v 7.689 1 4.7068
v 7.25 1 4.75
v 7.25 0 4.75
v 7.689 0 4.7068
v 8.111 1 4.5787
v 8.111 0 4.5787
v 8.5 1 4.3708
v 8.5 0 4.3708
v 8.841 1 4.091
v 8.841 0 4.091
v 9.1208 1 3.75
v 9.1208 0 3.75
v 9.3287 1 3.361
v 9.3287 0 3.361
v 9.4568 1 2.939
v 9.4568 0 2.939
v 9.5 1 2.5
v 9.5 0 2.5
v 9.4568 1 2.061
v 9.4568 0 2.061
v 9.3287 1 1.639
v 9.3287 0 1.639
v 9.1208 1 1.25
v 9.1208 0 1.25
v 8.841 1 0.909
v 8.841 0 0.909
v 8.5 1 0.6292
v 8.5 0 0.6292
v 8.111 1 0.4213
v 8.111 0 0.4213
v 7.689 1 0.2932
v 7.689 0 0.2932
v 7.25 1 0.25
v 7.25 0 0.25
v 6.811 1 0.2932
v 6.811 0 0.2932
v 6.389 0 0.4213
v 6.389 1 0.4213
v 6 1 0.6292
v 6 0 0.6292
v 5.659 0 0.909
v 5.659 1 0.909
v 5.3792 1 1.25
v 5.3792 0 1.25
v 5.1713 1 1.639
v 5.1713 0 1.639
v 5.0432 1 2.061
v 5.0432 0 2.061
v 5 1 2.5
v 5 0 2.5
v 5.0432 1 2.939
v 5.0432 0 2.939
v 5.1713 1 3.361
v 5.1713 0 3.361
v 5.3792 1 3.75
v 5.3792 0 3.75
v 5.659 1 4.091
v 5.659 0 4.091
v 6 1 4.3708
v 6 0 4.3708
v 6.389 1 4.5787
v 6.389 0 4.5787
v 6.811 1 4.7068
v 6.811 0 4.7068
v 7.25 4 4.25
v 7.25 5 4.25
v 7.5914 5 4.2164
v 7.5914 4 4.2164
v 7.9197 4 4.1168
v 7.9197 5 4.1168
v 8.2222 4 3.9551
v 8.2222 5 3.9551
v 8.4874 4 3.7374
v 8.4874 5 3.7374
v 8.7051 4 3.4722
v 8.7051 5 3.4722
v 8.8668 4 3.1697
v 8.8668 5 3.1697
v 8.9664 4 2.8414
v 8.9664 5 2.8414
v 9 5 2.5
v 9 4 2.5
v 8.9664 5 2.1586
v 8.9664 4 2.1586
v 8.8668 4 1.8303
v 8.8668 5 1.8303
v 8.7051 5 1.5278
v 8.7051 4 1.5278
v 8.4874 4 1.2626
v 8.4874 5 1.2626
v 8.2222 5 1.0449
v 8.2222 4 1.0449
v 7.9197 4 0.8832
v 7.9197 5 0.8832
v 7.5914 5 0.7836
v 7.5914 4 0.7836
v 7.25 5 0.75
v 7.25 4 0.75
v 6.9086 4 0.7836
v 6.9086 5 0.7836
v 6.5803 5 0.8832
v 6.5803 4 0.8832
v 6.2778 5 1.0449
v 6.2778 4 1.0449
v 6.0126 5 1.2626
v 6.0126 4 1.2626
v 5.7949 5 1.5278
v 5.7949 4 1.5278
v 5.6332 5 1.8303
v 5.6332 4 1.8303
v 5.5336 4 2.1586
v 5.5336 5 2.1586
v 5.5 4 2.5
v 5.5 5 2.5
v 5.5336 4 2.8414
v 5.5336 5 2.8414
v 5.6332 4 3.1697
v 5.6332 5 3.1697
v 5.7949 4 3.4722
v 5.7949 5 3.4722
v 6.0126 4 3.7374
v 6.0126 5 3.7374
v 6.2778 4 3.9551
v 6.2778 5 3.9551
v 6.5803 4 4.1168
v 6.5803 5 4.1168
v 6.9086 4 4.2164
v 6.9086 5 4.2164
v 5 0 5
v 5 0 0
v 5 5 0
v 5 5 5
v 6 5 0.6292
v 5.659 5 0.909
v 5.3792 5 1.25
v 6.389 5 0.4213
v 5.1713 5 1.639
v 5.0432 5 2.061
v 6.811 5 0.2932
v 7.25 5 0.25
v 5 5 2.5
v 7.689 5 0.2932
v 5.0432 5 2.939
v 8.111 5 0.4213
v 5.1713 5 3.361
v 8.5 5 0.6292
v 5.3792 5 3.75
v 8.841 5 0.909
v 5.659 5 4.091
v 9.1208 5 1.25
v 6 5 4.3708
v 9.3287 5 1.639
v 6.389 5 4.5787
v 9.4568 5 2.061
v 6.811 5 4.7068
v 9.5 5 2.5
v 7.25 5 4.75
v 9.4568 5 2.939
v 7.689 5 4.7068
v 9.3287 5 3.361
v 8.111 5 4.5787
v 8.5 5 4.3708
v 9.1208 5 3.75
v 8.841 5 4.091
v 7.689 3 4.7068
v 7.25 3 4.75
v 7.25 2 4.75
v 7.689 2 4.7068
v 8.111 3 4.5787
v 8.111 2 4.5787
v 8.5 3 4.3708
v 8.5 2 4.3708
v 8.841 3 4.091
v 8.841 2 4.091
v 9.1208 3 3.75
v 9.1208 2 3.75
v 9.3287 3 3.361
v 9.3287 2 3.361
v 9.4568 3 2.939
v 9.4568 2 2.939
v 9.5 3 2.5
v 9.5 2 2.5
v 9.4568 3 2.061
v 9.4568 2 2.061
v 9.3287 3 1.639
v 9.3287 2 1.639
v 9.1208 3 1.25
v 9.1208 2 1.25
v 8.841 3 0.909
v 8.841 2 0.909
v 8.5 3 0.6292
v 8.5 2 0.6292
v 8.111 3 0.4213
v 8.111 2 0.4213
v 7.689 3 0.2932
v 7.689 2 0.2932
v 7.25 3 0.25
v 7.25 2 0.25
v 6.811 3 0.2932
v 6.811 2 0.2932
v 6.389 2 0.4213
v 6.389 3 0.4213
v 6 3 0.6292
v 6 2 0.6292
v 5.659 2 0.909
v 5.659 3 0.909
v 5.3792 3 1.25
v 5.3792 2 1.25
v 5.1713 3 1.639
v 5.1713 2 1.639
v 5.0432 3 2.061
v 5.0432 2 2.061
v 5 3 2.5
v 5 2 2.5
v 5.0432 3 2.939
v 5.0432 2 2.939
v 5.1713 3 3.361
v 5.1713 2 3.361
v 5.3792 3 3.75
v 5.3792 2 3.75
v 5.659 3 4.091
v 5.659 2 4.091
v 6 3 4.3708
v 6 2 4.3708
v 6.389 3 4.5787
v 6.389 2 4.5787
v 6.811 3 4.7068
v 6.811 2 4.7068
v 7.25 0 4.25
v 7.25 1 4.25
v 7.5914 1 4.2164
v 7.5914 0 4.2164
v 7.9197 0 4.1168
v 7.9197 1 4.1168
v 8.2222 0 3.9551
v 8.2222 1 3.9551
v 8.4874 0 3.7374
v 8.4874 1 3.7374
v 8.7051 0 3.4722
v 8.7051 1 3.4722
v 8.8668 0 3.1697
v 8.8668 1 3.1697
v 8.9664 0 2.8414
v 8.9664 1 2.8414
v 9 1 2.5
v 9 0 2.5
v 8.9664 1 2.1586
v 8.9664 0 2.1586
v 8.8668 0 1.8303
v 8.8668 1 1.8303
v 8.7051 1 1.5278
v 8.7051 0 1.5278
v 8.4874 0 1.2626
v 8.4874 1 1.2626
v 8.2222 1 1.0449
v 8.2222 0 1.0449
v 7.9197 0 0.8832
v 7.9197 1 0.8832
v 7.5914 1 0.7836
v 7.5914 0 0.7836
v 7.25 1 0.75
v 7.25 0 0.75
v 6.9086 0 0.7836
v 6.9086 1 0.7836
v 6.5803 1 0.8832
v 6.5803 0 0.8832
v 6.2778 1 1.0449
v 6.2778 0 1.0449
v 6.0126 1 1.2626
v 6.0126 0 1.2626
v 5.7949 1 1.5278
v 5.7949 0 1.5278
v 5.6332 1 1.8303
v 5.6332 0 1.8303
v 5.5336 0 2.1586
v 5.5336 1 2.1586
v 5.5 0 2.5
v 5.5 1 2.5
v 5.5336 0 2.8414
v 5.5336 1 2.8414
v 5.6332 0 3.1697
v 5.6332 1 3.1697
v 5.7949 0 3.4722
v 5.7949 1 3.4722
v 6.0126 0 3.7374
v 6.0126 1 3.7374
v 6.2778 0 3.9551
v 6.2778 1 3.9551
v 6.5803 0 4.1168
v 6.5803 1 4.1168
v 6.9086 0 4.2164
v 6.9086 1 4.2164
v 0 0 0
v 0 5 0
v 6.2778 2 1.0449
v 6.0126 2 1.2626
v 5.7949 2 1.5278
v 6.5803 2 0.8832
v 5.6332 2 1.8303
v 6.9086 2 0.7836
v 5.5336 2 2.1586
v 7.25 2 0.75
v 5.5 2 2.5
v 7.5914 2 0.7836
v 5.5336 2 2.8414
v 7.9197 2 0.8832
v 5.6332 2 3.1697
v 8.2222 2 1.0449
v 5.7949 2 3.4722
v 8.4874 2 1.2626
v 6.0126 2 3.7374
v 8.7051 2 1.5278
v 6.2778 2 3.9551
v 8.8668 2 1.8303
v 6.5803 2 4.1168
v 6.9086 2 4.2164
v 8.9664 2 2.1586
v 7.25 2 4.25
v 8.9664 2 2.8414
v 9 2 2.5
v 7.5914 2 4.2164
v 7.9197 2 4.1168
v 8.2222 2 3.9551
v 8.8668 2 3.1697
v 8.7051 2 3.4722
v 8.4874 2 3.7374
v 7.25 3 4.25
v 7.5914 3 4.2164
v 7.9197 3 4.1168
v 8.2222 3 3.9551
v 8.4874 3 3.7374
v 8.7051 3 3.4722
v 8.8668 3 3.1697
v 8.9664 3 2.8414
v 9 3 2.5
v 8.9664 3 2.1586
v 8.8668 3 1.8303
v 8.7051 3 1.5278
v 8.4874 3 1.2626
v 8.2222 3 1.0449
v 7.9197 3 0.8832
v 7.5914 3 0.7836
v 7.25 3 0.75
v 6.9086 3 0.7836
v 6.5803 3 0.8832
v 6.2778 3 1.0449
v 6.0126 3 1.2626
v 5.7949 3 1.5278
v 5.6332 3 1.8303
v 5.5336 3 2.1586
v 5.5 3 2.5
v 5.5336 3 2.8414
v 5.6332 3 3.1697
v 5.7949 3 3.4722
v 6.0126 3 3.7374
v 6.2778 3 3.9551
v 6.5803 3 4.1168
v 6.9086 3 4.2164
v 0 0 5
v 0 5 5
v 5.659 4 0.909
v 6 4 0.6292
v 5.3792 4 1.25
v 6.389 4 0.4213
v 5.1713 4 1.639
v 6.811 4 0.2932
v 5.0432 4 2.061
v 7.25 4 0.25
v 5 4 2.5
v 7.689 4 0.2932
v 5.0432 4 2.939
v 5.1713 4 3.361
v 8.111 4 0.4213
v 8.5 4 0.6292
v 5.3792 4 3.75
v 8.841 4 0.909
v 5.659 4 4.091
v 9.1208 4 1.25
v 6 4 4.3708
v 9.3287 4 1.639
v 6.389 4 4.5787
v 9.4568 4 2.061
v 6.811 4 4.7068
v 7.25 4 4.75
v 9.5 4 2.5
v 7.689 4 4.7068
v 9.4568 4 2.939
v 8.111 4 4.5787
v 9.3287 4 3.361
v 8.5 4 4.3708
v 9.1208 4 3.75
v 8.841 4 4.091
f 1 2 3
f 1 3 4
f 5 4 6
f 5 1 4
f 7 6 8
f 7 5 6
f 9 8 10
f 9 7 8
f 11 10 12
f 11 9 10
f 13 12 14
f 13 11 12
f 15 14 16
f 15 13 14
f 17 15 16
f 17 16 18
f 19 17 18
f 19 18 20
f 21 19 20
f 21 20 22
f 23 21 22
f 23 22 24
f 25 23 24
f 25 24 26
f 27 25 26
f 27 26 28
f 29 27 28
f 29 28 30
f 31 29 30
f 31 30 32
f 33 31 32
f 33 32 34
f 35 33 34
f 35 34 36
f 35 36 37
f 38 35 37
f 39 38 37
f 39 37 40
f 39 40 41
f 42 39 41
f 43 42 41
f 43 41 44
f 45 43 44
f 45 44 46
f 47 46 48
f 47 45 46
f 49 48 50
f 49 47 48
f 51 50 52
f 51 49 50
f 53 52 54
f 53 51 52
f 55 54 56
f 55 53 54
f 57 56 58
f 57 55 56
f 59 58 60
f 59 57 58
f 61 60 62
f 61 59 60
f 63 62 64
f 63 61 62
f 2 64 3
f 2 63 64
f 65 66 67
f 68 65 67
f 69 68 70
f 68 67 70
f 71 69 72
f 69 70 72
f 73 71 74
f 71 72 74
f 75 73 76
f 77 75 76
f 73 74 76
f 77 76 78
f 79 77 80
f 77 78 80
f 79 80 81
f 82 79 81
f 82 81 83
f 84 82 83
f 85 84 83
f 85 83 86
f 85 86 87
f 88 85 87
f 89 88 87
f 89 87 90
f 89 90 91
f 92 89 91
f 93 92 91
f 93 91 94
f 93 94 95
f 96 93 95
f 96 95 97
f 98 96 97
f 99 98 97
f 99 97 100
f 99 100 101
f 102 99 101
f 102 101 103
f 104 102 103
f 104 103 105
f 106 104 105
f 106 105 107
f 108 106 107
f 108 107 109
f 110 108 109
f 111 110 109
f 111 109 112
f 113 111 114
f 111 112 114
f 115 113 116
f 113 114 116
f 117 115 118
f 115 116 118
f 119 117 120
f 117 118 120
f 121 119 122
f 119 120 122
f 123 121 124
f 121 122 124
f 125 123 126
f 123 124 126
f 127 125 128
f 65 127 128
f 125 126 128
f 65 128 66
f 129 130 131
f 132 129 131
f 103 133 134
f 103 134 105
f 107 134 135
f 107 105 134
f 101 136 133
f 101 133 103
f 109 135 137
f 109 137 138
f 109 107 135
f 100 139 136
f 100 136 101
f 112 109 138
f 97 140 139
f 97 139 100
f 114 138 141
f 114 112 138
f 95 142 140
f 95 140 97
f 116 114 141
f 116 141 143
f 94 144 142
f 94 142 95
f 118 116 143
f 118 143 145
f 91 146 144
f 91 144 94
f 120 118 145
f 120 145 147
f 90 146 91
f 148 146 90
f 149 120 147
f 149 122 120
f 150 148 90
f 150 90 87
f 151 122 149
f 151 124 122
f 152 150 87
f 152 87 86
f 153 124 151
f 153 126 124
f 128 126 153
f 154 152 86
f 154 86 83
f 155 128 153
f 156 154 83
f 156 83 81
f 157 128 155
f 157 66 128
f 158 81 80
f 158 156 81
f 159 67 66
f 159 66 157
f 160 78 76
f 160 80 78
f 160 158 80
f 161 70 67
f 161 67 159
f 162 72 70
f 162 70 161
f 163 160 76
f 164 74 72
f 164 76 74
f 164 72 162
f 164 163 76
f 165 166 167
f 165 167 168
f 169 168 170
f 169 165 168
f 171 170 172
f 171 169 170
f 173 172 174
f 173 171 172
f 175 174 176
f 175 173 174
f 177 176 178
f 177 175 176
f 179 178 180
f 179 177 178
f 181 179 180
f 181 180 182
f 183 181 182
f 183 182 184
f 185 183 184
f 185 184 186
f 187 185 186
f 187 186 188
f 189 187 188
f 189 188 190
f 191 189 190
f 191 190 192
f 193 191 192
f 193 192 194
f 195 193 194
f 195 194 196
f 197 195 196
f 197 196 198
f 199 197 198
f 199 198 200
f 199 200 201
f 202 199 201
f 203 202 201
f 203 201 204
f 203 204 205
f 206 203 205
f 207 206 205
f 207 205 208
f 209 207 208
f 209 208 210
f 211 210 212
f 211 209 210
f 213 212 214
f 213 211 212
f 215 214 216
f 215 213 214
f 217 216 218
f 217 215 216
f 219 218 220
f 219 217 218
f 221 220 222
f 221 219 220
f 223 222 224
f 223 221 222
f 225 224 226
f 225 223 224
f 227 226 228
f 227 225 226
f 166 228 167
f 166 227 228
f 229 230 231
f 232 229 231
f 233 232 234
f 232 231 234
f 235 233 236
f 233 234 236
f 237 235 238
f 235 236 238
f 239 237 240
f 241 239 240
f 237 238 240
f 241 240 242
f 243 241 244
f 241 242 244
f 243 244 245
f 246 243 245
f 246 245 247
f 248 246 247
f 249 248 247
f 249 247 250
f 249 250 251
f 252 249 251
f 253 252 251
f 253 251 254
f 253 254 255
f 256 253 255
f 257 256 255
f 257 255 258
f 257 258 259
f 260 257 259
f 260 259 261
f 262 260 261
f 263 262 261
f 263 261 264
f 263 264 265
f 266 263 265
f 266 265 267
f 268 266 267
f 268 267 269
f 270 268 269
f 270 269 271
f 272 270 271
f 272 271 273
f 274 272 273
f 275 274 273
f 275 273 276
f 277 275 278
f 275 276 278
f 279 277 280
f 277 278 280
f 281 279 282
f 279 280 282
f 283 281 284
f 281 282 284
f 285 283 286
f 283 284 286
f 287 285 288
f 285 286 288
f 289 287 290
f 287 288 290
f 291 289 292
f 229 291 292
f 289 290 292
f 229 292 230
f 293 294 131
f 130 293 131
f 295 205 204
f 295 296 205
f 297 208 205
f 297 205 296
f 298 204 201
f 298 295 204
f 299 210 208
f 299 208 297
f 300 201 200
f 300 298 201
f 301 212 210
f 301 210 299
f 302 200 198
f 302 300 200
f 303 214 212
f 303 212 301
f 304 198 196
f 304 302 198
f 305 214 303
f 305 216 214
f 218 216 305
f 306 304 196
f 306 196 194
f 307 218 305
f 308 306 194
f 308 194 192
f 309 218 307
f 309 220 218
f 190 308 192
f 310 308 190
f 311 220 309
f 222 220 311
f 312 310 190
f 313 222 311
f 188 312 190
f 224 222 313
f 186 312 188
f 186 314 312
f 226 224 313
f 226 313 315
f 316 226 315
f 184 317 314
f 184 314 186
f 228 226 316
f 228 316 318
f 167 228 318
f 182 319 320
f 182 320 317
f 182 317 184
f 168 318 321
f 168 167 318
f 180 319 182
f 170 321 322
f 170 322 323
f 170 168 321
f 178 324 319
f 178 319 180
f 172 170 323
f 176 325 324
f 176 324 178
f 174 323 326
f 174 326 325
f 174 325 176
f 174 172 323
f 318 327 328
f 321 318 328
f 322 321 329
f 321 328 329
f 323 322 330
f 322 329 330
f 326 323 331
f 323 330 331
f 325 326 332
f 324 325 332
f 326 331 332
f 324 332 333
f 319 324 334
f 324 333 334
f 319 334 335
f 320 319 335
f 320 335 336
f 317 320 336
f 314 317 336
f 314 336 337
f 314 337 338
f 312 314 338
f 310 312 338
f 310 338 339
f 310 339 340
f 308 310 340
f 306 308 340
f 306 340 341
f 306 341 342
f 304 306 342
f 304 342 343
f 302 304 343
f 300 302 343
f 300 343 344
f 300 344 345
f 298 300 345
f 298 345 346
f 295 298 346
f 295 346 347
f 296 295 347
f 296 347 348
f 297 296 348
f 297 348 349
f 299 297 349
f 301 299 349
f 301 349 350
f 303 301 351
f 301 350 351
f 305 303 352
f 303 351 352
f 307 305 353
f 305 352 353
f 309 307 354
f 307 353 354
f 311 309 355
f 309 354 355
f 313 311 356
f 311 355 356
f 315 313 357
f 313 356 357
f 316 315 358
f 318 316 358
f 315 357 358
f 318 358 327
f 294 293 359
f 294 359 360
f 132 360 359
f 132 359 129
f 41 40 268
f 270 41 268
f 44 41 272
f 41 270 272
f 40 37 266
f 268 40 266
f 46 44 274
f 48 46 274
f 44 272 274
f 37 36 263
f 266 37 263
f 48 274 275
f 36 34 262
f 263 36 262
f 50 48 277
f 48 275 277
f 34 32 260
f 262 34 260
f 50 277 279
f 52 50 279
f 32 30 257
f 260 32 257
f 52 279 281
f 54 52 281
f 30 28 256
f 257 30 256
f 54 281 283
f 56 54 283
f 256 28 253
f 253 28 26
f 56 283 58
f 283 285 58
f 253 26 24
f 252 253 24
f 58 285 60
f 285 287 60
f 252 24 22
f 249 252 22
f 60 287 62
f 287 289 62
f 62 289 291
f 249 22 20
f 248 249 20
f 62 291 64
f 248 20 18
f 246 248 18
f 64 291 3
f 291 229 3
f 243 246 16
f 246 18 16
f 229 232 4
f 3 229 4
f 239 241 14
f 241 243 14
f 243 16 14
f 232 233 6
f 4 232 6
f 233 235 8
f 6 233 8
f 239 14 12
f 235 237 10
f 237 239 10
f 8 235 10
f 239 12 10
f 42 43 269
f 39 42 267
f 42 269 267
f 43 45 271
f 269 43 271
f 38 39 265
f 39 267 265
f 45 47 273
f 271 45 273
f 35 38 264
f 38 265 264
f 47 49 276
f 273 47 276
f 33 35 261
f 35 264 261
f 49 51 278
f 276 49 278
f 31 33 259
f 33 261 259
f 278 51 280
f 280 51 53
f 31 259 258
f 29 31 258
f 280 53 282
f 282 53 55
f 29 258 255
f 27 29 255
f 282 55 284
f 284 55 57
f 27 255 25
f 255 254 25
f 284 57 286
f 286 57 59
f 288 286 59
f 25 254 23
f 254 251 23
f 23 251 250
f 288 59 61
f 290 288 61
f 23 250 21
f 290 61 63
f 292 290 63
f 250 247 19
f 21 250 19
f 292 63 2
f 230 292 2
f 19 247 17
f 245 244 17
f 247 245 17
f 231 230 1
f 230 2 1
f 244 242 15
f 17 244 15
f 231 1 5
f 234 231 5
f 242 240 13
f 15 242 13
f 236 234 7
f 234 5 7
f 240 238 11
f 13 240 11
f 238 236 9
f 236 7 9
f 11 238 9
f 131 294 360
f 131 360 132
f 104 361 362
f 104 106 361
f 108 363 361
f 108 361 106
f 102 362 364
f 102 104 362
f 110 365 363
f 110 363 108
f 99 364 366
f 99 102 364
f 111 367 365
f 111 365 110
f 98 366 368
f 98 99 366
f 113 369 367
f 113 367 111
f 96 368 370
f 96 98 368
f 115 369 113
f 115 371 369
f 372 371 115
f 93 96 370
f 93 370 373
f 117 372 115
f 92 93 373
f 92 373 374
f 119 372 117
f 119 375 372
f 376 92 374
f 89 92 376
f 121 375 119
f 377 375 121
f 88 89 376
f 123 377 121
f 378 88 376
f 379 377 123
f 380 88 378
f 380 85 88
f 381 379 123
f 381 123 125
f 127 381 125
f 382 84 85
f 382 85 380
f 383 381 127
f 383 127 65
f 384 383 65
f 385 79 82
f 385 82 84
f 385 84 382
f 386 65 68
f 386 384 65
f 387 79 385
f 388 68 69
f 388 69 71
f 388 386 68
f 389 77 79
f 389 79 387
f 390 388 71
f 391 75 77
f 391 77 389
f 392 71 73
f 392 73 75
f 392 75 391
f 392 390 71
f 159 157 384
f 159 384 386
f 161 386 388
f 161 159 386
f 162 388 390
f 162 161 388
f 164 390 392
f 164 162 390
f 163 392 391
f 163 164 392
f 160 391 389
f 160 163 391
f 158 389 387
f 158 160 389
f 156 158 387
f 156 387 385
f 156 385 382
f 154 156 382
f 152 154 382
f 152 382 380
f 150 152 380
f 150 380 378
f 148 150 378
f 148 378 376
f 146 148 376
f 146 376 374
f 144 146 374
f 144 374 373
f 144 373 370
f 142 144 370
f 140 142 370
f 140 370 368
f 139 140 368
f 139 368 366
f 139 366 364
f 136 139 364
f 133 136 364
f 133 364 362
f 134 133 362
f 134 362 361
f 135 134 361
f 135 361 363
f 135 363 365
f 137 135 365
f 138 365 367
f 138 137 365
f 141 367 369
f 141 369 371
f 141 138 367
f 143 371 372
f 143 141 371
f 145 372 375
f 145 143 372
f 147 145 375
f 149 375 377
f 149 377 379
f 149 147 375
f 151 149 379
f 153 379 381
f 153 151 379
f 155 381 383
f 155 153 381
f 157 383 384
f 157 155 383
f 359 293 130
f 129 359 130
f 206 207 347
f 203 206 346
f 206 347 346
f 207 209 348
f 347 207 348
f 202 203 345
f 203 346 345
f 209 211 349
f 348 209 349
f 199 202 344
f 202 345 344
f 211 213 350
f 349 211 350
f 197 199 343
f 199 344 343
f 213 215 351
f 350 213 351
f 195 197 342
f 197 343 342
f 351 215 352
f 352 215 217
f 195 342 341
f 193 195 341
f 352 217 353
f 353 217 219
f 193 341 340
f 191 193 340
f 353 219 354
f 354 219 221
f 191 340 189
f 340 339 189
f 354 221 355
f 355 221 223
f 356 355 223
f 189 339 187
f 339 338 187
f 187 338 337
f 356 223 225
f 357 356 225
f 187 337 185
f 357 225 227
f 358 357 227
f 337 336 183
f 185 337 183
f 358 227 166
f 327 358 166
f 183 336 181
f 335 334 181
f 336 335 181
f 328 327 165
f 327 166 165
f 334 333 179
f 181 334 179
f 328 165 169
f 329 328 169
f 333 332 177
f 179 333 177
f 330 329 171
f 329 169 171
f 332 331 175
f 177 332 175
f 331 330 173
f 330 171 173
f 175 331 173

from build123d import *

# Parameters (mm, degrees)
SKETCH2_W           = 5
SKETCH2_H           = 5
BOSS_EXTRUDE1_DEPTH = 5
SKETCH7_R           = 2.25
SKETCH7_R_2         = 1.75
BOSS_EXTRUDE4_DEPTH = 5
SKETCH14_W          = 4.5
SKETCH14_H          = 1
CUT_EXTRUDE8_DEPTH  = 5


with BuildPart() as part:
    # Sketch2 → Boss-Extrude1 (new body)
    with BuildSketch(Plane.XY):
        with Locations((2.5, 2.5)):
            Rectangle(SKETCH2_W, SKETCH2_H)
    extrude(amount=BOSS_EXTRUDE1_DEPTH)


with BuildPart() as body_2:
    # Sketch7 → Boss-Extrude4 (new body)
    with BuildSketch(Plane(origin=(0, 5, 0), x_dir=(1, 0, 0), z_dir=(0, 1, 0))):
        with Locations(Location((7.25, -2.5, 0), (0, 0, 270))):
            Circle(SKETCH7_R)
        with Locations(Location((7.25, -2.5, 0), (0, 0, 270))):
            Circle(SKETCH7_R_2, mode=Mode.SUBTRACT)
    extrude(amount=-BOSS_EXTRUDE4_DEPTH)

    # Sketch14 → Cut-Extrude8 (cut)
    with BuildSketch(Plane.XY.offset(5)):
        with Locations((7.25, 3.5)):
            Rectangle(SKETCH14_W, SKETCH14_H)
        with Locations((7.25, 1.5)):
            Rectangle(SKETCH14_W, SKETCH14_H)
    extrude(amount=-CUT_EXTRUDE8_DEPTH, mode=Mode.SUBTRACT)


with BuildPart() as cut_extrude8_piece_1:
    # of the separate pieces the step leaves, piece 1, a body of its own (cut_extrude8_pieces)
    add(body_2.part.solids().sort_by_distance((7.25, 3, 4.75))[0])


with BuildPart() as cut_extrude8_piece_2:
    # of the separate pieces the step leaves, piece 2, a body of its own (cut_extrude8_pieces)
    add(body_2.part.solids().sort_by_distance((7.25, 1, 4.75))[0])


with BuildPart() as cut_extrude8_piece_3:
    # of the separate pieces the step leaves, piece 3, a body of its own (cut_extrude8_pieces)
    add(body_2.part.solids().sort_by_distance((7.25, 5, 4.75))[0])


solid = Compound([part.part, cut_extrude8_piece_1.part, cut_extrude8_piece_2.part, cut_extrude8_piece_3.part])
